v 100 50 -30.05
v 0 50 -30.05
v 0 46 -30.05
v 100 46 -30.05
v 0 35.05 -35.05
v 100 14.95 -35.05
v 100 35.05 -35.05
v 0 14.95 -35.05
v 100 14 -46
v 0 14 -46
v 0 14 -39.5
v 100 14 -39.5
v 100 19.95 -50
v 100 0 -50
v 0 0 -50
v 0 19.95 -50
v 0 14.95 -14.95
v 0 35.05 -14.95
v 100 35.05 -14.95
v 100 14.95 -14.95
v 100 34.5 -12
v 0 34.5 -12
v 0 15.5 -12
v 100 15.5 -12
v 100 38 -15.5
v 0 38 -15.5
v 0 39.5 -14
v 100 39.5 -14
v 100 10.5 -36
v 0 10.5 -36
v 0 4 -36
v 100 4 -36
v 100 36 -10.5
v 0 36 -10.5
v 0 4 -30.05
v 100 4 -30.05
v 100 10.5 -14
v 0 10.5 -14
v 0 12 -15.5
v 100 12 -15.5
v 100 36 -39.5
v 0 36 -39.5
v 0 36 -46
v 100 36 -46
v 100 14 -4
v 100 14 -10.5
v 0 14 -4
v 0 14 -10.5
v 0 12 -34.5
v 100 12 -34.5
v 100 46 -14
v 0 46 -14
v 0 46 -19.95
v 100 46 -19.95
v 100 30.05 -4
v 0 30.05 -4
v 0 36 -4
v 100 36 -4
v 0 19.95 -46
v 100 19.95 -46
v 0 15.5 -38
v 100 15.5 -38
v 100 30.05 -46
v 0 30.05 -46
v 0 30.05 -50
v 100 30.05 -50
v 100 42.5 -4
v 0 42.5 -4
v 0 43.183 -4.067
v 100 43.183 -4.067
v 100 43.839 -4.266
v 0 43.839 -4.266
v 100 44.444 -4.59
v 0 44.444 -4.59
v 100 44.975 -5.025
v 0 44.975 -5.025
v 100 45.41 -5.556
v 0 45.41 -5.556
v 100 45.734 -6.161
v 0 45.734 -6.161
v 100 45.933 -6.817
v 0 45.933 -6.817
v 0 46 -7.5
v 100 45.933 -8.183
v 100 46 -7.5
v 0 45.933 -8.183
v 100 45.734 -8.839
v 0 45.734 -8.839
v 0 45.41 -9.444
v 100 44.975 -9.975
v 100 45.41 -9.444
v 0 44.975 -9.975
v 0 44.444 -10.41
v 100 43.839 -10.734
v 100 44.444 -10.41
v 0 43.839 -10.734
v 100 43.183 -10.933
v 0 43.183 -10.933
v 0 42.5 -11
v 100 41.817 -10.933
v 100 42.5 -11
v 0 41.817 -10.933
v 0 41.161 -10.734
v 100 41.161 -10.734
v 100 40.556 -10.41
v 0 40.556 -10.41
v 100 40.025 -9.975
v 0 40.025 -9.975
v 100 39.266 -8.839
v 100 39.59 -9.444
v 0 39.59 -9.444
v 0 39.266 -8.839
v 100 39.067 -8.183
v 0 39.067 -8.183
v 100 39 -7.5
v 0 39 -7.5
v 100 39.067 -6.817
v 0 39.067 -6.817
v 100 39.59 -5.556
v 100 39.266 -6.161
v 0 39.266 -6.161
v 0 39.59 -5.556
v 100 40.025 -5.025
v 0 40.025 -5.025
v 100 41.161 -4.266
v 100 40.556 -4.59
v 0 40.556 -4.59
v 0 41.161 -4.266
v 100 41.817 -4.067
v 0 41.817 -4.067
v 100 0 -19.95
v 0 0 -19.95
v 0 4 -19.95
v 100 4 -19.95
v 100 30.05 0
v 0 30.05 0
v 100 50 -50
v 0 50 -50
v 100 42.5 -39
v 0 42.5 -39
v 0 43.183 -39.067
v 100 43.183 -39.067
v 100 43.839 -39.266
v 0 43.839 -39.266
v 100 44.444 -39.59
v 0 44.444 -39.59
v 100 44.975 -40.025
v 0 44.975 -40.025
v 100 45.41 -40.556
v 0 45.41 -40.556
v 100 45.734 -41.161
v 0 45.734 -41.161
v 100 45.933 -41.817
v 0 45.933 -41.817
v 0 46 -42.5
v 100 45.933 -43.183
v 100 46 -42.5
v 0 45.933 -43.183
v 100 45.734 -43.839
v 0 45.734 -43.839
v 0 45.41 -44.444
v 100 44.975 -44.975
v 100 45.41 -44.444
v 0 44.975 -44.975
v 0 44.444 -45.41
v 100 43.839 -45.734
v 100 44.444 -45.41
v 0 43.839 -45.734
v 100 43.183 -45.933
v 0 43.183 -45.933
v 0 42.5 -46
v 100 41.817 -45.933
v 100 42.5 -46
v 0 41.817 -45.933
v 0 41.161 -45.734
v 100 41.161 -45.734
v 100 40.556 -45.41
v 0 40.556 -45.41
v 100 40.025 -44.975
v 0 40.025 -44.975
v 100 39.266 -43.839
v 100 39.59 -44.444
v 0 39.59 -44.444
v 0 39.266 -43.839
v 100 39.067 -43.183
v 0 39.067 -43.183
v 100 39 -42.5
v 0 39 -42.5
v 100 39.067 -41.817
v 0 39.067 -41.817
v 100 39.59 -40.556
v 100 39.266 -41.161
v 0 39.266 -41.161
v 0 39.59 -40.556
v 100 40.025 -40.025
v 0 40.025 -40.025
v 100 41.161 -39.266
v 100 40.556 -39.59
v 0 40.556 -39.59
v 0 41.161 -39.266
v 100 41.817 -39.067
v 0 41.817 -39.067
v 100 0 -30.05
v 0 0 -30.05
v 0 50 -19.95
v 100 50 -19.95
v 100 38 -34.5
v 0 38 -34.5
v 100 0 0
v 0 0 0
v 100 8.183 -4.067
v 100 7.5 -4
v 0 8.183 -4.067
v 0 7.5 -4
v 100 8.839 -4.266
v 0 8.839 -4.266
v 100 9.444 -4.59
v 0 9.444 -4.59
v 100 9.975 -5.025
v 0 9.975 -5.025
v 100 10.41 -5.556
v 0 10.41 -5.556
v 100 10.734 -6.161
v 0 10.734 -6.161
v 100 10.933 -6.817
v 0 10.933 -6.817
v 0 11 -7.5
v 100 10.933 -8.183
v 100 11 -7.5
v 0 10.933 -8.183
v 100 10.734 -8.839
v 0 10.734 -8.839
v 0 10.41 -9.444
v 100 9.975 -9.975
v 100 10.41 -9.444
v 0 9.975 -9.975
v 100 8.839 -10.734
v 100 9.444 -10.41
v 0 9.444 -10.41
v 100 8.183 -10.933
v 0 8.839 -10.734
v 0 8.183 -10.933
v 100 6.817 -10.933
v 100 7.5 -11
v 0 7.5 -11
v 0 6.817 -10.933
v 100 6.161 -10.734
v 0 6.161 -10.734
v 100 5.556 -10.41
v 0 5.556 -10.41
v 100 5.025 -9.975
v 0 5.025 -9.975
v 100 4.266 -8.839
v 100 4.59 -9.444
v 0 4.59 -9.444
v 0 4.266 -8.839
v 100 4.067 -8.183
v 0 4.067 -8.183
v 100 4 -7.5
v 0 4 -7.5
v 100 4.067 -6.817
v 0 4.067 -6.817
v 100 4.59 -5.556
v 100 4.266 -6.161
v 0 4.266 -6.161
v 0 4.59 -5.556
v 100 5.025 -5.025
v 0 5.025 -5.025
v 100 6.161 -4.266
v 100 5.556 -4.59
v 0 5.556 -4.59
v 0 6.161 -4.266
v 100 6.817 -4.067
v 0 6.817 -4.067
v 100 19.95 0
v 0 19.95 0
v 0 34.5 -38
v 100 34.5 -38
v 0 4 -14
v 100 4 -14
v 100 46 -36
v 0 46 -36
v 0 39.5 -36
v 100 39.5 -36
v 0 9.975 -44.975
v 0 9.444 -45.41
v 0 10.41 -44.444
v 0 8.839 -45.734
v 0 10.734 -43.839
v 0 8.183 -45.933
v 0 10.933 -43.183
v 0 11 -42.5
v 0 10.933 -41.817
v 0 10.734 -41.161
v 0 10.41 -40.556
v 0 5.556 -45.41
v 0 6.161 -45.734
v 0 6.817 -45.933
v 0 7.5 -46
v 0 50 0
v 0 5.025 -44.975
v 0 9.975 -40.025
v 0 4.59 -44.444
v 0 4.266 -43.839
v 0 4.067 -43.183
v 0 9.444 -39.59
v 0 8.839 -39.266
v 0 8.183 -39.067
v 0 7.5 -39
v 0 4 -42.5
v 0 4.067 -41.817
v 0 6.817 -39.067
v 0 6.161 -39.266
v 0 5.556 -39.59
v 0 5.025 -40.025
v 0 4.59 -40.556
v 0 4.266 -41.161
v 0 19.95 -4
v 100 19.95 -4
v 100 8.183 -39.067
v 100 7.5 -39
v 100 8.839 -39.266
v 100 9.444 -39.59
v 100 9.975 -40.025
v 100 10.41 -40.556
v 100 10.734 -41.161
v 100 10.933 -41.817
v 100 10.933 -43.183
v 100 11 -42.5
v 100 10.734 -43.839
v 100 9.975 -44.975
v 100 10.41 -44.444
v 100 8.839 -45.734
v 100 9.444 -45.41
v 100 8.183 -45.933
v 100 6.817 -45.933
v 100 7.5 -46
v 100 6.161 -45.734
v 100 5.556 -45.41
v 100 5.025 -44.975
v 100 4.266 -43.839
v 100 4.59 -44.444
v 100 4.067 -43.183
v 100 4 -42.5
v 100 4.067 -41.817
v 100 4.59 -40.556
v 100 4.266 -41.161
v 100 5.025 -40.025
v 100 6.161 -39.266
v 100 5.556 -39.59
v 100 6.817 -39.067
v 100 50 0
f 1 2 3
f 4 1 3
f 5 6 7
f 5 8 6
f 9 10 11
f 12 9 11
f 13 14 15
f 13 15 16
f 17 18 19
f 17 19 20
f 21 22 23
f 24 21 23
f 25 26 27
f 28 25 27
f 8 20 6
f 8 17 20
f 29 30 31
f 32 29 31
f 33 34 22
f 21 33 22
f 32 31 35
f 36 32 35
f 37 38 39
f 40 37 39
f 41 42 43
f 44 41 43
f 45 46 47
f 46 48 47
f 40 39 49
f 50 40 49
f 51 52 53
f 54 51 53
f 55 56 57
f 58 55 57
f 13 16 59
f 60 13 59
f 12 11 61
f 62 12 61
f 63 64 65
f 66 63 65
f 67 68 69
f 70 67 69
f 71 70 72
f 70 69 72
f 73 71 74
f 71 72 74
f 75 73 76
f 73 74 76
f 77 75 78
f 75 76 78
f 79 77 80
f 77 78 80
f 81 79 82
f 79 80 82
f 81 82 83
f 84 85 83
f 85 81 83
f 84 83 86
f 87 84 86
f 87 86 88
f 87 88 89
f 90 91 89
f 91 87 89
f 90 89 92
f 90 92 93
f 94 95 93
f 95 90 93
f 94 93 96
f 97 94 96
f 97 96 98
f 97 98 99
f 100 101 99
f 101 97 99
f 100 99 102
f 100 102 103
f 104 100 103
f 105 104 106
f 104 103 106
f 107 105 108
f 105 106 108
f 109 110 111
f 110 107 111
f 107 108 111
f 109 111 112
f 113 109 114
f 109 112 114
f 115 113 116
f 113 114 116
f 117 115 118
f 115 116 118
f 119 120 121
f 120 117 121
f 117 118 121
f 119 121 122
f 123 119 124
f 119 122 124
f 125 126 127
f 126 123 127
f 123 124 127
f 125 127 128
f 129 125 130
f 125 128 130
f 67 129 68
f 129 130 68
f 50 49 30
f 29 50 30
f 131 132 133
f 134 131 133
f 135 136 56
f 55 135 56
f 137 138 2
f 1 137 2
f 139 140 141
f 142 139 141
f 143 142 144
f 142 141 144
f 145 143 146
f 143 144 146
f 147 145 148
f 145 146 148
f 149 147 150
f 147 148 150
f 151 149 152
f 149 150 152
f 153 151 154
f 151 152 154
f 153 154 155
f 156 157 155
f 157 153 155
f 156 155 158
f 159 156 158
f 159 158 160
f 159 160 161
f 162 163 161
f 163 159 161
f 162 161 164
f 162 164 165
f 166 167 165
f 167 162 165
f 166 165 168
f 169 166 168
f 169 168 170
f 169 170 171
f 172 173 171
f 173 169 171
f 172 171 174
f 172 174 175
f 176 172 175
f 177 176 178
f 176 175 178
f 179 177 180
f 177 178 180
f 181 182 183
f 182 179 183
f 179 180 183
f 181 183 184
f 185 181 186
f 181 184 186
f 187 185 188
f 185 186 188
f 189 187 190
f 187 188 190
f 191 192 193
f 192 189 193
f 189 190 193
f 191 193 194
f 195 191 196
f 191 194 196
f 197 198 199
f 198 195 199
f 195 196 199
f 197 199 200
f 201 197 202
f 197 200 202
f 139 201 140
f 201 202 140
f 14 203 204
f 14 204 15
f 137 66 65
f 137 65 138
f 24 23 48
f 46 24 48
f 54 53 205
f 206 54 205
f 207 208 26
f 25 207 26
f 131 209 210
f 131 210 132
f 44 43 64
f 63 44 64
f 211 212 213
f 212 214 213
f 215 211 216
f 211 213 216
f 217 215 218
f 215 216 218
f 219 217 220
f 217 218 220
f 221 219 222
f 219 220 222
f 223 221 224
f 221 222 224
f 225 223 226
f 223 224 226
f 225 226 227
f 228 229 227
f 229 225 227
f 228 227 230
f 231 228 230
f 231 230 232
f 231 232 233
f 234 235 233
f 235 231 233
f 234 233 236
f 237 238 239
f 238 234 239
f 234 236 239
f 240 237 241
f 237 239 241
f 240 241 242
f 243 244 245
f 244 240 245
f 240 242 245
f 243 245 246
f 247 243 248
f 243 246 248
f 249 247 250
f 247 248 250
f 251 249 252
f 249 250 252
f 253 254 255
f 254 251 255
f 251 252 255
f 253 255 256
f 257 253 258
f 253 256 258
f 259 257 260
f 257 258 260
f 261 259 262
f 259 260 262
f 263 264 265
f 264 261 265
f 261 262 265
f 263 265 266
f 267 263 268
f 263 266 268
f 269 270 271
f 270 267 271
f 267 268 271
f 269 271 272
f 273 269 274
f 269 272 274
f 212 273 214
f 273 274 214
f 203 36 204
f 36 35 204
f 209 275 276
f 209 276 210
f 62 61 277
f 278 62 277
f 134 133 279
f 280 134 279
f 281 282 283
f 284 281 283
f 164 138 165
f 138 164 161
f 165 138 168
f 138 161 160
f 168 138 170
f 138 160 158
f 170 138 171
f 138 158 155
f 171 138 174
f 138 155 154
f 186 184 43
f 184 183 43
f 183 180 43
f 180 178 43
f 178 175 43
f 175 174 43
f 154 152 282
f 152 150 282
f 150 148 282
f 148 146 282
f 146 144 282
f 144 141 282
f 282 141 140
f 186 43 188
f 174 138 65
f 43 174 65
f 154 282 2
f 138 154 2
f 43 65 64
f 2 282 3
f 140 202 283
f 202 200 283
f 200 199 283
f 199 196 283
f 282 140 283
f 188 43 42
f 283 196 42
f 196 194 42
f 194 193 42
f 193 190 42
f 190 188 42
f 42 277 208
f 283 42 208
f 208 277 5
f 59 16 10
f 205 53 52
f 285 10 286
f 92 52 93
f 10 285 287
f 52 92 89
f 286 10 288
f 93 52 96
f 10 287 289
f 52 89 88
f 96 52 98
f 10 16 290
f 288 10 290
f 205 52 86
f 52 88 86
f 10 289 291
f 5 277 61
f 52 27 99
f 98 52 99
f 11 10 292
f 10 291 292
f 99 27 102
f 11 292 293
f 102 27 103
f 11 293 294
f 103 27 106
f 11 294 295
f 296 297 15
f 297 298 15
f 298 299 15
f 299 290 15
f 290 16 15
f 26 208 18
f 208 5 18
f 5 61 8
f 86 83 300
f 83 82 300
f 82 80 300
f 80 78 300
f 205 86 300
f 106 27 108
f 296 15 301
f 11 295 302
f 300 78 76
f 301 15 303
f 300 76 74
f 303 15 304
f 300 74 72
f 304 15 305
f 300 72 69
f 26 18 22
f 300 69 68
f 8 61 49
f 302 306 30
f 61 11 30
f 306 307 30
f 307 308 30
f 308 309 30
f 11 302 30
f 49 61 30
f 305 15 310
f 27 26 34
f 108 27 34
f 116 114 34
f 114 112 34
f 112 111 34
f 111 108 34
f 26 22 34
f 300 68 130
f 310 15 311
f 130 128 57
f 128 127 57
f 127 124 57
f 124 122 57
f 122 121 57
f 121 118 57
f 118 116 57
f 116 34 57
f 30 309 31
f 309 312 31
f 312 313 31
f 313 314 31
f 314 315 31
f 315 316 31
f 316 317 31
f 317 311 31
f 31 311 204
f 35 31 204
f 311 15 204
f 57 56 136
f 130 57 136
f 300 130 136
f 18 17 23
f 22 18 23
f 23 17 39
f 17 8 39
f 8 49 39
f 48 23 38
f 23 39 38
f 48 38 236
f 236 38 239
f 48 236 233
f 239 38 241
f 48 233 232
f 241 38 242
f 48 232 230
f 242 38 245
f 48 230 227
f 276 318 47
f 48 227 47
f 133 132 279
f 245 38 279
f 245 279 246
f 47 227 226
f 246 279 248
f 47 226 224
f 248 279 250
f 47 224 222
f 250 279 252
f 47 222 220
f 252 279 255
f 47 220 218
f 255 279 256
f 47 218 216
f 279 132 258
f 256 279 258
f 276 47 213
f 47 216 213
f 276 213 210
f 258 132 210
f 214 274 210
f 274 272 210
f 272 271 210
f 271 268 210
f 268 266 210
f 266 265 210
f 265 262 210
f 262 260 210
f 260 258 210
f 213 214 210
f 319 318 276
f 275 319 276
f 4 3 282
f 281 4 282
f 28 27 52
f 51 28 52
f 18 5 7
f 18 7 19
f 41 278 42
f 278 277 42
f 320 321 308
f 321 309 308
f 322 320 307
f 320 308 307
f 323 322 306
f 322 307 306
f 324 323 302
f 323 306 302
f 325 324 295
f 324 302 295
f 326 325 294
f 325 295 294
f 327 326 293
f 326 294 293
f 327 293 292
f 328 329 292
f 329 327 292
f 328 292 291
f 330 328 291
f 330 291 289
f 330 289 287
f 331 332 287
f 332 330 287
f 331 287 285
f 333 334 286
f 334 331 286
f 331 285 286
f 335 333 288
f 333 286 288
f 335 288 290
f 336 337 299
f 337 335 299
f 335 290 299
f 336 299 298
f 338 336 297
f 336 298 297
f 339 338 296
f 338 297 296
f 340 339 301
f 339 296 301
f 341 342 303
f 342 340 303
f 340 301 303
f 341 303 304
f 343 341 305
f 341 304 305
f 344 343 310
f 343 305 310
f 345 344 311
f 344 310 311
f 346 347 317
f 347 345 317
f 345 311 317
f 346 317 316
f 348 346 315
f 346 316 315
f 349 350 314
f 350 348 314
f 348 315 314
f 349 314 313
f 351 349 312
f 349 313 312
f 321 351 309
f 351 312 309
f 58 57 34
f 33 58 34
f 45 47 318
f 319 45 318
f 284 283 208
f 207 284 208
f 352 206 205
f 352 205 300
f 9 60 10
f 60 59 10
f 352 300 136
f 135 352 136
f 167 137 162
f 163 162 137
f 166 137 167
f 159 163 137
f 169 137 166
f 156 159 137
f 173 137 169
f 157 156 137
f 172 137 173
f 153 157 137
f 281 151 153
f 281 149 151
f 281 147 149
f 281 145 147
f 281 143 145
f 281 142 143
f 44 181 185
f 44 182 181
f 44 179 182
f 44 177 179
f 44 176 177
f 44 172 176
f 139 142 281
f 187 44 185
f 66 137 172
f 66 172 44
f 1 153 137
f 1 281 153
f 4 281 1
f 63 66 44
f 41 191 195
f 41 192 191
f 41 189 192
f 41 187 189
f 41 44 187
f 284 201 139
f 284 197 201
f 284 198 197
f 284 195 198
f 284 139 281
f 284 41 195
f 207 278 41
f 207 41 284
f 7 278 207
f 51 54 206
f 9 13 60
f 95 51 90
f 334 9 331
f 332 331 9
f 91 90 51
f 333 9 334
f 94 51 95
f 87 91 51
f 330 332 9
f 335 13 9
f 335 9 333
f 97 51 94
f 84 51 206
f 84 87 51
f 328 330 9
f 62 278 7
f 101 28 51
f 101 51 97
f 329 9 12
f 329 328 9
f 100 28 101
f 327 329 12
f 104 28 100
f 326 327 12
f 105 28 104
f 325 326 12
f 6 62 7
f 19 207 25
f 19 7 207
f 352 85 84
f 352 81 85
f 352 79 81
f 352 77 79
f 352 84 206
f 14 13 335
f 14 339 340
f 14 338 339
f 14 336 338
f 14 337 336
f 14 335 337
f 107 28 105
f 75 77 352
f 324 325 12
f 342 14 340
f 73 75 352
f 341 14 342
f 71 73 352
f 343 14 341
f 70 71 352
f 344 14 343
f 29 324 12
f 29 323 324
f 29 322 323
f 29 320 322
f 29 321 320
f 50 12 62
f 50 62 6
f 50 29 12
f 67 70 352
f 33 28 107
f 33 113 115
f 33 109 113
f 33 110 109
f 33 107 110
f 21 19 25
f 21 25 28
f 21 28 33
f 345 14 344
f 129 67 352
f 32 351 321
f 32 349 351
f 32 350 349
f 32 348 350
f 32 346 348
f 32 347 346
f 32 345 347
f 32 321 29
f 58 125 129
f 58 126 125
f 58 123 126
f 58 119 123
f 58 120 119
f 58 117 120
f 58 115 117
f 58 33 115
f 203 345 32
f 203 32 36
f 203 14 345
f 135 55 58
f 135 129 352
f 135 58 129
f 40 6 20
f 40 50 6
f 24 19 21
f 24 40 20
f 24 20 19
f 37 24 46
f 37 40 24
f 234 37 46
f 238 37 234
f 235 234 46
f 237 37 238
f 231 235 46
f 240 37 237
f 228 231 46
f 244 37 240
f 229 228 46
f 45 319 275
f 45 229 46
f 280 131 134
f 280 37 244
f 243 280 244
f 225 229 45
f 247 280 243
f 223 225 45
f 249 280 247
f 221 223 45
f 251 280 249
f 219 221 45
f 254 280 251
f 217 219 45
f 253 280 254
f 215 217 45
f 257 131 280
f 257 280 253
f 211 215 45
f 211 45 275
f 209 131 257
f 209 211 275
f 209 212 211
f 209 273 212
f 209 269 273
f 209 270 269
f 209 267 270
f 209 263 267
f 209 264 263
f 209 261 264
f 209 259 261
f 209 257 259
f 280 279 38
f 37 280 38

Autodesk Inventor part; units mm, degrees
ref_plane "YZ Plane" through (0, 0, 0) normal (1, 0, 0) x (0, 1, 0)
ref_plane "XZ Plane" through (0, 0, 0) normal (0, 1, 0) x (-1, 0, 0)
ref_plane "XY Plane" through (0, 0, 0) normal (0, 0, 1) x (1, 0, 0)
sketch "Skizze_1" plane through (0, 0, 0) normal (1, 0, 0) x (0, 0, 1)
  line L0 (0, 0) -> (-19.95, 0)
  line L1 (-19.95, 0) -> (-19.95, -4)
  line L2 (-19.95, -4) -> (-14, -4)
  line L3 (-14, -4) -> (-14, -10.5)
  line L4 (-14, -10.5) -> (-15.5, -12)
  line L5 (-15.5, -12) -> (-34.5, -12)
  line L6 (-34.5, -12) -> (-36, -10.5)
  line L7 (-36, -10.5) -> (-36, -4)
  line L8 (-36, -4) -> (-30.05, -4)
  line L9 (-30.05, -4) -> (-30.05, 0)
  line L10 (-30.05, 0) -> (-50, 0)
  line L11 (-50, 0) -> (-50, -19.95)
  line L12 (-50, -19.95) -> (-46, -19.95)
  line L13 (-46, -19.95) -> (-46, -14)
  line L14 (-46, -14) -> (-39.5, -14)
  line L15 (-39.5, -14) -> (-38, -15.5)
  line L16 (-38, -15.5) -> (-38, -34.5)
  line L17 (-38, -34.5) -> (-39.5, -36)
  line L18 (-39.5, -36) -> (-46, -36)
  line L19 (-46, -36) -> (-46, -30.05)
  line L20 (-46, -30.05) -> (-50, -30.05)
  line L21 (-50, -30.05) -> (-50, -50)
  line L22 (-50, -50) -> (-30.05, -50)
  line L23 (-30.05, -50) -> (-30.05, -46)
  line L24 (-30.05, -46) -> (-36, -46)
  line L25 (-36, -46) -> (-36, -39.5)
  line L26 (-36, -39.5) -> (-34.5, -38)
  line L27 (-34.5, -38) -> (-15.5, -38)
  line L28 (-15.5, -38) -> (-14, -39.5)
  line L29 (-14, -39.5) -> (-14, -46)
  line L30 (-14, -46) -> (-19.95, -46)
  line L31 (-19.95, -46) -> (-19.95, -50)
  line L32 (-19.95, -50) -> (0, -50)
  line L33 (0, -50) -> (0, -30.05)
  line L34 (0, -30.05) -> (-4, -30.05)
  line L35 (-4, -30.05) -> (-4, -36)
  line L36 (-4, -36) -> (-10.5, -36)
  line L37 (-10.5, -36) -> (-12, -34.5)
  line L38 (-12, -34.5) -> (-12, -15.5)
  line L39 (-12, -15.5) -> (-10.5, -14)
  line L40 (-10.5, -14) -> (-4, -14)
  line L41 (-4, -14) -> (-4, -19.95)
  line L42 (-4, -19.95) -> (0, -19.95)
  line L43 (0, -19.95) -> (0, 0)
  circle A0 centre (-42.5, -42.5) radius 3.5
  circle A1 centre (-42.5, -7.5) radius 3.5
  line L44 (-14.95, -35.05) -> (-14.95, -14.95)
  line L45 (-14.95, -14.95) -> (-35.05, -14.95)
  line L46 (-35.05, -14.95) -> (-35.05, -35.05)
  line L47 (-35.05, -35.05) -> (-14.95, -35.05)
  circle A2 centre (-7.5, -42.5) radius 3.5
  circle A3 centre (-7.5, -7.5) radius 3.5
extrude "MK, 50MM" add sketch "Skizze_1" along normal blind 100
properties part number "BAR, EXTRUDED ALUM, 50MMX50MM, MK, 2000 SERIES" material "Aluminum, 6061-T6"
